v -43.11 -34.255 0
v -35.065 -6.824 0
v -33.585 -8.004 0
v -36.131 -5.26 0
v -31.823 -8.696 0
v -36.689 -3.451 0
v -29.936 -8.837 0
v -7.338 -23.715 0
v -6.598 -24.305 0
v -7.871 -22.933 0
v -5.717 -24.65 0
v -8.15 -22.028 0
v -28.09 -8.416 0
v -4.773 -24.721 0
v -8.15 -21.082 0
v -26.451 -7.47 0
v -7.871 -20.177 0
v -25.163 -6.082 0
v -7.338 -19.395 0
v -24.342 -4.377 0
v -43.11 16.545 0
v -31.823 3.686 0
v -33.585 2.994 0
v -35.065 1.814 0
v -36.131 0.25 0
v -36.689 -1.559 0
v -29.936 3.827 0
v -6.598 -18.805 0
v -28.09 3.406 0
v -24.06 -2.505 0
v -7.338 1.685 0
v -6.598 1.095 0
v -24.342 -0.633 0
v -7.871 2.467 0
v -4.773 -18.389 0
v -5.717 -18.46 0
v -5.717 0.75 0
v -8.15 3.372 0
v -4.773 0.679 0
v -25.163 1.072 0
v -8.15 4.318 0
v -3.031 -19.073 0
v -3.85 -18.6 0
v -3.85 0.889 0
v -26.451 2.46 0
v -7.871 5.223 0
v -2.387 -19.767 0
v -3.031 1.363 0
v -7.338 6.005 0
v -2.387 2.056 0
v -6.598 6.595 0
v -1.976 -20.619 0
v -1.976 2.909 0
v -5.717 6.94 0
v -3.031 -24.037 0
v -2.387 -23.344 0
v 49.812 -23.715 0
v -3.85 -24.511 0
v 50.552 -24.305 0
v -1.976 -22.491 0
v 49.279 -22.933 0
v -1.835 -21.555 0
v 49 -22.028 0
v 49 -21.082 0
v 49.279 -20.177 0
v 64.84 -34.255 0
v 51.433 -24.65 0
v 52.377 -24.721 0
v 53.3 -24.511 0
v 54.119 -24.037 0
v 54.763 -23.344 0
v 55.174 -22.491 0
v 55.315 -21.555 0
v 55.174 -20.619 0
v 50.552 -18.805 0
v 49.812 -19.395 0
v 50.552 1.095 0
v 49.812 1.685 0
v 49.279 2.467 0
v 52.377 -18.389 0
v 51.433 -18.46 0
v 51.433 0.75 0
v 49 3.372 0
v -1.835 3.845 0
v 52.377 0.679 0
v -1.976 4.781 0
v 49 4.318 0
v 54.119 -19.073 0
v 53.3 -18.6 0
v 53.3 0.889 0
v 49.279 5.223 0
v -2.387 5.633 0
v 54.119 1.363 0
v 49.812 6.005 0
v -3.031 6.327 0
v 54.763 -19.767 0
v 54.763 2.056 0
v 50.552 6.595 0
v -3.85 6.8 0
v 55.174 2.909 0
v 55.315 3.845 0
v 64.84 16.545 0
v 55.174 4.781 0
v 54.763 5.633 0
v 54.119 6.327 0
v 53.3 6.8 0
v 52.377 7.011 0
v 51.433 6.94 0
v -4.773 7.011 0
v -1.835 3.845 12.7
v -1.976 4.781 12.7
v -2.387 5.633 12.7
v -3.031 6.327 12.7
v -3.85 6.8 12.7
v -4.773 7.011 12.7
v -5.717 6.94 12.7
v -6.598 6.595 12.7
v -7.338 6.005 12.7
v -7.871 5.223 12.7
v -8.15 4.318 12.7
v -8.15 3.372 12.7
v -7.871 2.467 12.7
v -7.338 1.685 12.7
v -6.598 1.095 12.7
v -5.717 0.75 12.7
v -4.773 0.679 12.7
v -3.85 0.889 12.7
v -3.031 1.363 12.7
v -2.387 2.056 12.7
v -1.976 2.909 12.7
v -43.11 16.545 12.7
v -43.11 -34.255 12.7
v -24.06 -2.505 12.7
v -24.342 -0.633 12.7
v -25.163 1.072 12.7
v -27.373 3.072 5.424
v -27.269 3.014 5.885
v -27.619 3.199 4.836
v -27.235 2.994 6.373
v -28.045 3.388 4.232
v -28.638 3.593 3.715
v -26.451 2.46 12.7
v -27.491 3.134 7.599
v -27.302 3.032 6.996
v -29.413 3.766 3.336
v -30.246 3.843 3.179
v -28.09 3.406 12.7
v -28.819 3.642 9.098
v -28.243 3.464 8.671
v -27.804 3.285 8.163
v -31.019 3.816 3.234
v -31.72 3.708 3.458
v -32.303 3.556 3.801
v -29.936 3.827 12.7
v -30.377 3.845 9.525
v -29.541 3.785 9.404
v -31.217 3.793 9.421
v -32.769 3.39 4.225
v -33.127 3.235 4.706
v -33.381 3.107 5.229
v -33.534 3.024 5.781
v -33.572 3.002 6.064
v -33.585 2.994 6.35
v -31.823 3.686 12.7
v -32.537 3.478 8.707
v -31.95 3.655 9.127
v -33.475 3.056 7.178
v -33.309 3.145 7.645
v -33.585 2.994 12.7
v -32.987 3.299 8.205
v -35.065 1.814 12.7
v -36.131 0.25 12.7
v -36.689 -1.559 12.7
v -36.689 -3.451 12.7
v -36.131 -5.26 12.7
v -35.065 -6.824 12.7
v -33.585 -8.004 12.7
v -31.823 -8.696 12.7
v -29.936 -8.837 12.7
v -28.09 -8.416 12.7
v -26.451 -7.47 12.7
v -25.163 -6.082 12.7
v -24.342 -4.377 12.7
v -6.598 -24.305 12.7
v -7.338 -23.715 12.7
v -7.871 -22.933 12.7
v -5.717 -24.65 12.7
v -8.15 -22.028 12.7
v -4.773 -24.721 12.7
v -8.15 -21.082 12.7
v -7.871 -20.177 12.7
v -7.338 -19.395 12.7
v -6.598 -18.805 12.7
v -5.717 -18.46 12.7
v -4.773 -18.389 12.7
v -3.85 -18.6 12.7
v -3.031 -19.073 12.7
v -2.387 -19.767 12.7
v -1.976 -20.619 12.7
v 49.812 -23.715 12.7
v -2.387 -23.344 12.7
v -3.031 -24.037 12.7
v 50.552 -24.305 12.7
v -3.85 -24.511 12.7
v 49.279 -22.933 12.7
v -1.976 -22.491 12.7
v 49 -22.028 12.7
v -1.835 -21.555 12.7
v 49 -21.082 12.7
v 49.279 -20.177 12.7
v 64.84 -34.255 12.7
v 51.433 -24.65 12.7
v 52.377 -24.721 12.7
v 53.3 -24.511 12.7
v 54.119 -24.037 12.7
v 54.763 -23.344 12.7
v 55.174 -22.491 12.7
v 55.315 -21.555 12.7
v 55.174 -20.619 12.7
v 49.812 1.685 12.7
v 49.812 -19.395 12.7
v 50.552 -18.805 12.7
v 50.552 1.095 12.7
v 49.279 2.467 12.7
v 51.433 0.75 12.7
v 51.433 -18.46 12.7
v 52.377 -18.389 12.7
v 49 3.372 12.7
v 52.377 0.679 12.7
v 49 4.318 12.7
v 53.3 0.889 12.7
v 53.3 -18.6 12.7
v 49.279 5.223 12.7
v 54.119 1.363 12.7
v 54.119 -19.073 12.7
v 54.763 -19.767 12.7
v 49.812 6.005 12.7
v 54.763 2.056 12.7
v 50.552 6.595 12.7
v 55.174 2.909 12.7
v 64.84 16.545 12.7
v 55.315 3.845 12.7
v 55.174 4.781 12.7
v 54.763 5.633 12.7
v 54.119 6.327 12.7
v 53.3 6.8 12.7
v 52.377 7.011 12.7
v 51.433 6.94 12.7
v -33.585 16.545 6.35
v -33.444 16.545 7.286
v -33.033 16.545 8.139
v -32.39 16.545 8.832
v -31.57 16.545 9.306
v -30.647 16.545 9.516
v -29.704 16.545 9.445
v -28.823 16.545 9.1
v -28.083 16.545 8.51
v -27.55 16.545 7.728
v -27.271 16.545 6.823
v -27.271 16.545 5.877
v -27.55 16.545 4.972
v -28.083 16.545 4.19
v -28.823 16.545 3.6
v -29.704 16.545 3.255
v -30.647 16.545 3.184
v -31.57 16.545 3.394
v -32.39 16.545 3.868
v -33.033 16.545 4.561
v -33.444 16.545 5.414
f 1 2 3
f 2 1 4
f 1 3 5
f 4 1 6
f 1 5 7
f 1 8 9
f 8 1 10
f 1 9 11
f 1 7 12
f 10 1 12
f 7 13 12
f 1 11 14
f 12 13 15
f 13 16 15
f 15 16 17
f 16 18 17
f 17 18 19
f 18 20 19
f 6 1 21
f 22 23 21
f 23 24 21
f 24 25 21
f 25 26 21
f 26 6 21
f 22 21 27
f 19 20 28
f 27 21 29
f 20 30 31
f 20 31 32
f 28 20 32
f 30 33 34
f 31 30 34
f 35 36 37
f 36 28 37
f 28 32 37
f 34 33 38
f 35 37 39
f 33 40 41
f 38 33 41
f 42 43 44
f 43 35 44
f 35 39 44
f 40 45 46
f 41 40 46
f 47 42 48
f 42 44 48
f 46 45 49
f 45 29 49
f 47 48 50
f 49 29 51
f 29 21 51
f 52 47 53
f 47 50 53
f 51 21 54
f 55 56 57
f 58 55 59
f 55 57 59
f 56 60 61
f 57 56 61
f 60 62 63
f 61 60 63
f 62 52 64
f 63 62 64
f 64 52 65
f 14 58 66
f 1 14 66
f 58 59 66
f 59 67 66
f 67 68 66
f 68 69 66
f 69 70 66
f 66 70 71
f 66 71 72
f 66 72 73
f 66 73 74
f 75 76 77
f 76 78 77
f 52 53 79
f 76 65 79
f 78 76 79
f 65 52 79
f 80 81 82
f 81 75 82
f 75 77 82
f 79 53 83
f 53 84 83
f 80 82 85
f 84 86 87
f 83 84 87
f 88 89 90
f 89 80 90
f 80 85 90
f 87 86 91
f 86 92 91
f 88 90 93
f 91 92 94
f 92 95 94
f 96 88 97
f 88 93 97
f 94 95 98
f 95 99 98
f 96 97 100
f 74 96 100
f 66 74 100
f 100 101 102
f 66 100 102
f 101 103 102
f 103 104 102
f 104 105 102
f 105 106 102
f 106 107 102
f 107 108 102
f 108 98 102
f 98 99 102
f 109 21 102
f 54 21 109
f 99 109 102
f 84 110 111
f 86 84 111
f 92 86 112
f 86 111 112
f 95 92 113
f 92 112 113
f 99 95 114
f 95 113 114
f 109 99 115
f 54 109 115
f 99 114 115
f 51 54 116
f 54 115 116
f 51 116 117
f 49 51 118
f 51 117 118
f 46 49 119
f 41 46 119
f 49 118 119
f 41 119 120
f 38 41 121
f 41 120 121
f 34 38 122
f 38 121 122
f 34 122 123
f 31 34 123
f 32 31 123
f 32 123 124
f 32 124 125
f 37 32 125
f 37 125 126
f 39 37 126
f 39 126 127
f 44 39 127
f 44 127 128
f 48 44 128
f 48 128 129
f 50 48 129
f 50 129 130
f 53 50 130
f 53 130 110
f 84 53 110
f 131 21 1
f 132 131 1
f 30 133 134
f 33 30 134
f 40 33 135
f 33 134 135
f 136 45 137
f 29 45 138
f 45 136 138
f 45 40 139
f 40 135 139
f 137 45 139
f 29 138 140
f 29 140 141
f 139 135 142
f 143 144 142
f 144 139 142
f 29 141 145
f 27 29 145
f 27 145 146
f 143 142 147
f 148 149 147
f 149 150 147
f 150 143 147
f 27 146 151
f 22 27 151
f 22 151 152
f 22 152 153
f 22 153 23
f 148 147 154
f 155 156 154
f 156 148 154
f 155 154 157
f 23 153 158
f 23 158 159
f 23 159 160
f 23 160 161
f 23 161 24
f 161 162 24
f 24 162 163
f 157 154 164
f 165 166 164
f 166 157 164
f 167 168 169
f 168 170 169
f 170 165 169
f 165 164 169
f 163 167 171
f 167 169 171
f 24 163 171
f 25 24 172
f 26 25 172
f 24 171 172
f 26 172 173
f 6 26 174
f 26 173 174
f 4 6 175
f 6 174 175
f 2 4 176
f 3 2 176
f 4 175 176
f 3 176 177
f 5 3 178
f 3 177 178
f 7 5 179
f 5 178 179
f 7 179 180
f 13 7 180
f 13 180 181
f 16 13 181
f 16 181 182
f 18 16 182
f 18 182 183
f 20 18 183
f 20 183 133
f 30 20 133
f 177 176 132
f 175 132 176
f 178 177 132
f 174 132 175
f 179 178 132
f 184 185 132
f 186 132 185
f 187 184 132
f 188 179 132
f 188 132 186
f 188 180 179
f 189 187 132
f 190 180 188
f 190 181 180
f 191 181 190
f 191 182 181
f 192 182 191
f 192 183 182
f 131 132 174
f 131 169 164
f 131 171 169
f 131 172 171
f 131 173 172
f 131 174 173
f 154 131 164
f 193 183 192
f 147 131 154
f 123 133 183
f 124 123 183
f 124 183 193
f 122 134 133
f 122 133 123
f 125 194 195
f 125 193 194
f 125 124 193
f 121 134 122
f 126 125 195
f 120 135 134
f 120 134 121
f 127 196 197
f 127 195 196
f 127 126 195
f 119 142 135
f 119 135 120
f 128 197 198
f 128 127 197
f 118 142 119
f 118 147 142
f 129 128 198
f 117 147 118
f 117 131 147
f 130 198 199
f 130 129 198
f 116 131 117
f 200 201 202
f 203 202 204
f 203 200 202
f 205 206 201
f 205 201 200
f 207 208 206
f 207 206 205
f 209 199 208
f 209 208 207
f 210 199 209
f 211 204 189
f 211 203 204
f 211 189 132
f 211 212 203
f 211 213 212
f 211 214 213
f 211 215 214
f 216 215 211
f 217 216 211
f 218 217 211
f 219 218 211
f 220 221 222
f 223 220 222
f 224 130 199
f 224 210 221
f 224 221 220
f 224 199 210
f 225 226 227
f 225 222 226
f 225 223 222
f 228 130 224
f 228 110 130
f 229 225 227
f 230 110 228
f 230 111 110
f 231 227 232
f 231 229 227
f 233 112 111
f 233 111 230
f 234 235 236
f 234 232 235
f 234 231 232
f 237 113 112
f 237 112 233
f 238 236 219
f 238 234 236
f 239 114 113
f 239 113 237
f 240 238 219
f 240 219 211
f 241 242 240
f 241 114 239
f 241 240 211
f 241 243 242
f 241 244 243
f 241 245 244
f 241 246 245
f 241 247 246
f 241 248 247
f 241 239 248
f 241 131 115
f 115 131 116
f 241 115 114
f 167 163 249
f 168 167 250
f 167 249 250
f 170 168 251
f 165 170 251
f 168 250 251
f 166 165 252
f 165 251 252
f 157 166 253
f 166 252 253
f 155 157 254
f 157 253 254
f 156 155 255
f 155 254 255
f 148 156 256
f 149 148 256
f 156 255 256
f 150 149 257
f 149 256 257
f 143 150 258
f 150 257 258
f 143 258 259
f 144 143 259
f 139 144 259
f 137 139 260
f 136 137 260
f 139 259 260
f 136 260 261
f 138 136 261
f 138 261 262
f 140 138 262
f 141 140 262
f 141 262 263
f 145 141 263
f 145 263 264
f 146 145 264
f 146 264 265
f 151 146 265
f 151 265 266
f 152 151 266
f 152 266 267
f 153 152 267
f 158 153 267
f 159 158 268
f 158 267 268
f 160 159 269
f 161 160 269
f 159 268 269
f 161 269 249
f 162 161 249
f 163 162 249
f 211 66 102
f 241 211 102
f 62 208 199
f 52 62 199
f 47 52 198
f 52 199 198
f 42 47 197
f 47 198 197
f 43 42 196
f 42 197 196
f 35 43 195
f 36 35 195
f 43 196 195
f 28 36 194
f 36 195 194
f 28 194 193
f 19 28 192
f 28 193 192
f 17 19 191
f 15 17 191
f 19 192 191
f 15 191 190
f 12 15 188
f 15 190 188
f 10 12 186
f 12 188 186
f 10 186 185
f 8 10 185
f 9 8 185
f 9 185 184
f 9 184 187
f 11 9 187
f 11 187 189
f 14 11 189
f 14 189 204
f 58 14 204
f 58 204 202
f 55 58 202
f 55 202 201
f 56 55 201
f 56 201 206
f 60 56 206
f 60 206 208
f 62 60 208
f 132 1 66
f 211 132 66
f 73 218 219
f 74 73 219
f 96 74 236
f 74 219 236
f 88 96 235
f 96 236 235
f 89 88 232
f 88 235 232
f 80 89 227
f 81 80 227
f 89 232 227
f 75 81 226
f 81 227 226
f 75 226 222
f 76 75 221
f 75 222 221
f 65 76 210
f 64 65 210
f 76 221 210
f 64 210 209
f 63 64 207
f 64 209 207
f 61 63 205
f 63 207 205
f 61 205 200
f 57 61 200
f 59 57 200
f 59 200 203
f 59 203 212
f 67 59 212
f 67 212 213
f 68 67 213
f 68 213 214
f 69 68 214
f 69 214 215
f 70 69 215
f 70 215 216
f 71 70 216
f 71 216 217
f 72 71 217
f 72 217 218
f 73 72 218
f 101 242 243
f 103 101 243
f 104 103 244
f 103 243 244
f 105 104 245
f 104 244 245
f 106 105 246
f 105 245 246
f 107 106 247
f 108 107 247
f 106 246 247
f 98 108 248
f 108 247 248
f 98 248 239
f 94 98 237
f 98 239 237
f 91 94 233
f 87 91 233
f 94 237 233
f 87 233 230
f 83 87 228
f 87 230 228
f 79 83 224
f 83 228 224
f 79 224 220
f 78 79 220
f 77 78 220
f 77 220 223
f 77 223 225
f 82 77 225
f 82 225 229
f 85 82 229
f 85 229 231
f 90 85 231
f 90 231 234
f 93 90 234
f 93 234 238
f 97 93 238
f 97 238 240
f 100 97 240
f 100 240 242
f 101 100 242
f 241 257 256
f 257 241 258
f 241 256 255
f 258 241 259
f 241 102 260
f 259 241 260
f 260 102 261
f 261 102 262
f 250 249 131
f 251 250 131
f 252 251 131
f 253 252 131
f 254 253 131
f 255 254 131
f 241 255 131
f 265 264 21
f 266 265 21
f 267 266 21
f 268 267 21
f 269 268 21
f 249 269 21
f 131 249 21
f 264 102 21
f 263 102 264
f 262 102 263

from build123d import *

# Parameters (mm, degrees)
F1_DEPTH = 12.7
F2_R     = 3.175
F3_DEPTH = 25.4
F4_R     = 6.35
F5_DEPTH = 25.4
F6_R     = 3.175
F7_DEPTH = 19.05


with BuildPart() as f1:
    # F0 (on Top) → F1 (new body)
    with BuildSketch(Plane.XY):
        Polygon((64.839908, 16.544953), (0, 16.544953), (-43.110092, 16.544953), (-43.110092, -34.255047), (64.839908, -34.255047), align=None)
    extrude(amount=F1_DEPTH)

    # F2 (on face) → F3 (cut)
    with BuildSketch(Plane.XY.offset(12.7)):
        with Locations((-5.010092, -21.555047)):
            Circle(F2_R)
        with Locations((-5.010092, 3.844953)):
            Circle(F2_R)
        with Locations((52.139908, 3.844953)):
            Circle(F2_R)
        with Locations((52.139908, -21.555047)):
            Circle(F2_R)
    extrude(amount=-F3_DEPTH, mode=Mode.SUBTRACT)

    # F4 (on face) → F5 (cut)
    with BuildSketch(Plane.XY.offset(12.7)):
        with Locations((-30.410092, -2.505047)):
            Circle(F4_R)
    extrude(amount=-F5_DEPTH, mode=Mode.SUBTRACT)

    # F6 (on face) → F7 (cut)
    with BuildSketch(Plane(origin=(0, 16.544953, 0), x_dir=(-1, 0, 0), z_dir=(0, 1, 0))):
        with Locations((30.410092, 6.35)):
            Circle(F6_R)
    extrude(amount=-F7_DEPTH, mode=Mode.SUBTRACT)


solid = f1.part
